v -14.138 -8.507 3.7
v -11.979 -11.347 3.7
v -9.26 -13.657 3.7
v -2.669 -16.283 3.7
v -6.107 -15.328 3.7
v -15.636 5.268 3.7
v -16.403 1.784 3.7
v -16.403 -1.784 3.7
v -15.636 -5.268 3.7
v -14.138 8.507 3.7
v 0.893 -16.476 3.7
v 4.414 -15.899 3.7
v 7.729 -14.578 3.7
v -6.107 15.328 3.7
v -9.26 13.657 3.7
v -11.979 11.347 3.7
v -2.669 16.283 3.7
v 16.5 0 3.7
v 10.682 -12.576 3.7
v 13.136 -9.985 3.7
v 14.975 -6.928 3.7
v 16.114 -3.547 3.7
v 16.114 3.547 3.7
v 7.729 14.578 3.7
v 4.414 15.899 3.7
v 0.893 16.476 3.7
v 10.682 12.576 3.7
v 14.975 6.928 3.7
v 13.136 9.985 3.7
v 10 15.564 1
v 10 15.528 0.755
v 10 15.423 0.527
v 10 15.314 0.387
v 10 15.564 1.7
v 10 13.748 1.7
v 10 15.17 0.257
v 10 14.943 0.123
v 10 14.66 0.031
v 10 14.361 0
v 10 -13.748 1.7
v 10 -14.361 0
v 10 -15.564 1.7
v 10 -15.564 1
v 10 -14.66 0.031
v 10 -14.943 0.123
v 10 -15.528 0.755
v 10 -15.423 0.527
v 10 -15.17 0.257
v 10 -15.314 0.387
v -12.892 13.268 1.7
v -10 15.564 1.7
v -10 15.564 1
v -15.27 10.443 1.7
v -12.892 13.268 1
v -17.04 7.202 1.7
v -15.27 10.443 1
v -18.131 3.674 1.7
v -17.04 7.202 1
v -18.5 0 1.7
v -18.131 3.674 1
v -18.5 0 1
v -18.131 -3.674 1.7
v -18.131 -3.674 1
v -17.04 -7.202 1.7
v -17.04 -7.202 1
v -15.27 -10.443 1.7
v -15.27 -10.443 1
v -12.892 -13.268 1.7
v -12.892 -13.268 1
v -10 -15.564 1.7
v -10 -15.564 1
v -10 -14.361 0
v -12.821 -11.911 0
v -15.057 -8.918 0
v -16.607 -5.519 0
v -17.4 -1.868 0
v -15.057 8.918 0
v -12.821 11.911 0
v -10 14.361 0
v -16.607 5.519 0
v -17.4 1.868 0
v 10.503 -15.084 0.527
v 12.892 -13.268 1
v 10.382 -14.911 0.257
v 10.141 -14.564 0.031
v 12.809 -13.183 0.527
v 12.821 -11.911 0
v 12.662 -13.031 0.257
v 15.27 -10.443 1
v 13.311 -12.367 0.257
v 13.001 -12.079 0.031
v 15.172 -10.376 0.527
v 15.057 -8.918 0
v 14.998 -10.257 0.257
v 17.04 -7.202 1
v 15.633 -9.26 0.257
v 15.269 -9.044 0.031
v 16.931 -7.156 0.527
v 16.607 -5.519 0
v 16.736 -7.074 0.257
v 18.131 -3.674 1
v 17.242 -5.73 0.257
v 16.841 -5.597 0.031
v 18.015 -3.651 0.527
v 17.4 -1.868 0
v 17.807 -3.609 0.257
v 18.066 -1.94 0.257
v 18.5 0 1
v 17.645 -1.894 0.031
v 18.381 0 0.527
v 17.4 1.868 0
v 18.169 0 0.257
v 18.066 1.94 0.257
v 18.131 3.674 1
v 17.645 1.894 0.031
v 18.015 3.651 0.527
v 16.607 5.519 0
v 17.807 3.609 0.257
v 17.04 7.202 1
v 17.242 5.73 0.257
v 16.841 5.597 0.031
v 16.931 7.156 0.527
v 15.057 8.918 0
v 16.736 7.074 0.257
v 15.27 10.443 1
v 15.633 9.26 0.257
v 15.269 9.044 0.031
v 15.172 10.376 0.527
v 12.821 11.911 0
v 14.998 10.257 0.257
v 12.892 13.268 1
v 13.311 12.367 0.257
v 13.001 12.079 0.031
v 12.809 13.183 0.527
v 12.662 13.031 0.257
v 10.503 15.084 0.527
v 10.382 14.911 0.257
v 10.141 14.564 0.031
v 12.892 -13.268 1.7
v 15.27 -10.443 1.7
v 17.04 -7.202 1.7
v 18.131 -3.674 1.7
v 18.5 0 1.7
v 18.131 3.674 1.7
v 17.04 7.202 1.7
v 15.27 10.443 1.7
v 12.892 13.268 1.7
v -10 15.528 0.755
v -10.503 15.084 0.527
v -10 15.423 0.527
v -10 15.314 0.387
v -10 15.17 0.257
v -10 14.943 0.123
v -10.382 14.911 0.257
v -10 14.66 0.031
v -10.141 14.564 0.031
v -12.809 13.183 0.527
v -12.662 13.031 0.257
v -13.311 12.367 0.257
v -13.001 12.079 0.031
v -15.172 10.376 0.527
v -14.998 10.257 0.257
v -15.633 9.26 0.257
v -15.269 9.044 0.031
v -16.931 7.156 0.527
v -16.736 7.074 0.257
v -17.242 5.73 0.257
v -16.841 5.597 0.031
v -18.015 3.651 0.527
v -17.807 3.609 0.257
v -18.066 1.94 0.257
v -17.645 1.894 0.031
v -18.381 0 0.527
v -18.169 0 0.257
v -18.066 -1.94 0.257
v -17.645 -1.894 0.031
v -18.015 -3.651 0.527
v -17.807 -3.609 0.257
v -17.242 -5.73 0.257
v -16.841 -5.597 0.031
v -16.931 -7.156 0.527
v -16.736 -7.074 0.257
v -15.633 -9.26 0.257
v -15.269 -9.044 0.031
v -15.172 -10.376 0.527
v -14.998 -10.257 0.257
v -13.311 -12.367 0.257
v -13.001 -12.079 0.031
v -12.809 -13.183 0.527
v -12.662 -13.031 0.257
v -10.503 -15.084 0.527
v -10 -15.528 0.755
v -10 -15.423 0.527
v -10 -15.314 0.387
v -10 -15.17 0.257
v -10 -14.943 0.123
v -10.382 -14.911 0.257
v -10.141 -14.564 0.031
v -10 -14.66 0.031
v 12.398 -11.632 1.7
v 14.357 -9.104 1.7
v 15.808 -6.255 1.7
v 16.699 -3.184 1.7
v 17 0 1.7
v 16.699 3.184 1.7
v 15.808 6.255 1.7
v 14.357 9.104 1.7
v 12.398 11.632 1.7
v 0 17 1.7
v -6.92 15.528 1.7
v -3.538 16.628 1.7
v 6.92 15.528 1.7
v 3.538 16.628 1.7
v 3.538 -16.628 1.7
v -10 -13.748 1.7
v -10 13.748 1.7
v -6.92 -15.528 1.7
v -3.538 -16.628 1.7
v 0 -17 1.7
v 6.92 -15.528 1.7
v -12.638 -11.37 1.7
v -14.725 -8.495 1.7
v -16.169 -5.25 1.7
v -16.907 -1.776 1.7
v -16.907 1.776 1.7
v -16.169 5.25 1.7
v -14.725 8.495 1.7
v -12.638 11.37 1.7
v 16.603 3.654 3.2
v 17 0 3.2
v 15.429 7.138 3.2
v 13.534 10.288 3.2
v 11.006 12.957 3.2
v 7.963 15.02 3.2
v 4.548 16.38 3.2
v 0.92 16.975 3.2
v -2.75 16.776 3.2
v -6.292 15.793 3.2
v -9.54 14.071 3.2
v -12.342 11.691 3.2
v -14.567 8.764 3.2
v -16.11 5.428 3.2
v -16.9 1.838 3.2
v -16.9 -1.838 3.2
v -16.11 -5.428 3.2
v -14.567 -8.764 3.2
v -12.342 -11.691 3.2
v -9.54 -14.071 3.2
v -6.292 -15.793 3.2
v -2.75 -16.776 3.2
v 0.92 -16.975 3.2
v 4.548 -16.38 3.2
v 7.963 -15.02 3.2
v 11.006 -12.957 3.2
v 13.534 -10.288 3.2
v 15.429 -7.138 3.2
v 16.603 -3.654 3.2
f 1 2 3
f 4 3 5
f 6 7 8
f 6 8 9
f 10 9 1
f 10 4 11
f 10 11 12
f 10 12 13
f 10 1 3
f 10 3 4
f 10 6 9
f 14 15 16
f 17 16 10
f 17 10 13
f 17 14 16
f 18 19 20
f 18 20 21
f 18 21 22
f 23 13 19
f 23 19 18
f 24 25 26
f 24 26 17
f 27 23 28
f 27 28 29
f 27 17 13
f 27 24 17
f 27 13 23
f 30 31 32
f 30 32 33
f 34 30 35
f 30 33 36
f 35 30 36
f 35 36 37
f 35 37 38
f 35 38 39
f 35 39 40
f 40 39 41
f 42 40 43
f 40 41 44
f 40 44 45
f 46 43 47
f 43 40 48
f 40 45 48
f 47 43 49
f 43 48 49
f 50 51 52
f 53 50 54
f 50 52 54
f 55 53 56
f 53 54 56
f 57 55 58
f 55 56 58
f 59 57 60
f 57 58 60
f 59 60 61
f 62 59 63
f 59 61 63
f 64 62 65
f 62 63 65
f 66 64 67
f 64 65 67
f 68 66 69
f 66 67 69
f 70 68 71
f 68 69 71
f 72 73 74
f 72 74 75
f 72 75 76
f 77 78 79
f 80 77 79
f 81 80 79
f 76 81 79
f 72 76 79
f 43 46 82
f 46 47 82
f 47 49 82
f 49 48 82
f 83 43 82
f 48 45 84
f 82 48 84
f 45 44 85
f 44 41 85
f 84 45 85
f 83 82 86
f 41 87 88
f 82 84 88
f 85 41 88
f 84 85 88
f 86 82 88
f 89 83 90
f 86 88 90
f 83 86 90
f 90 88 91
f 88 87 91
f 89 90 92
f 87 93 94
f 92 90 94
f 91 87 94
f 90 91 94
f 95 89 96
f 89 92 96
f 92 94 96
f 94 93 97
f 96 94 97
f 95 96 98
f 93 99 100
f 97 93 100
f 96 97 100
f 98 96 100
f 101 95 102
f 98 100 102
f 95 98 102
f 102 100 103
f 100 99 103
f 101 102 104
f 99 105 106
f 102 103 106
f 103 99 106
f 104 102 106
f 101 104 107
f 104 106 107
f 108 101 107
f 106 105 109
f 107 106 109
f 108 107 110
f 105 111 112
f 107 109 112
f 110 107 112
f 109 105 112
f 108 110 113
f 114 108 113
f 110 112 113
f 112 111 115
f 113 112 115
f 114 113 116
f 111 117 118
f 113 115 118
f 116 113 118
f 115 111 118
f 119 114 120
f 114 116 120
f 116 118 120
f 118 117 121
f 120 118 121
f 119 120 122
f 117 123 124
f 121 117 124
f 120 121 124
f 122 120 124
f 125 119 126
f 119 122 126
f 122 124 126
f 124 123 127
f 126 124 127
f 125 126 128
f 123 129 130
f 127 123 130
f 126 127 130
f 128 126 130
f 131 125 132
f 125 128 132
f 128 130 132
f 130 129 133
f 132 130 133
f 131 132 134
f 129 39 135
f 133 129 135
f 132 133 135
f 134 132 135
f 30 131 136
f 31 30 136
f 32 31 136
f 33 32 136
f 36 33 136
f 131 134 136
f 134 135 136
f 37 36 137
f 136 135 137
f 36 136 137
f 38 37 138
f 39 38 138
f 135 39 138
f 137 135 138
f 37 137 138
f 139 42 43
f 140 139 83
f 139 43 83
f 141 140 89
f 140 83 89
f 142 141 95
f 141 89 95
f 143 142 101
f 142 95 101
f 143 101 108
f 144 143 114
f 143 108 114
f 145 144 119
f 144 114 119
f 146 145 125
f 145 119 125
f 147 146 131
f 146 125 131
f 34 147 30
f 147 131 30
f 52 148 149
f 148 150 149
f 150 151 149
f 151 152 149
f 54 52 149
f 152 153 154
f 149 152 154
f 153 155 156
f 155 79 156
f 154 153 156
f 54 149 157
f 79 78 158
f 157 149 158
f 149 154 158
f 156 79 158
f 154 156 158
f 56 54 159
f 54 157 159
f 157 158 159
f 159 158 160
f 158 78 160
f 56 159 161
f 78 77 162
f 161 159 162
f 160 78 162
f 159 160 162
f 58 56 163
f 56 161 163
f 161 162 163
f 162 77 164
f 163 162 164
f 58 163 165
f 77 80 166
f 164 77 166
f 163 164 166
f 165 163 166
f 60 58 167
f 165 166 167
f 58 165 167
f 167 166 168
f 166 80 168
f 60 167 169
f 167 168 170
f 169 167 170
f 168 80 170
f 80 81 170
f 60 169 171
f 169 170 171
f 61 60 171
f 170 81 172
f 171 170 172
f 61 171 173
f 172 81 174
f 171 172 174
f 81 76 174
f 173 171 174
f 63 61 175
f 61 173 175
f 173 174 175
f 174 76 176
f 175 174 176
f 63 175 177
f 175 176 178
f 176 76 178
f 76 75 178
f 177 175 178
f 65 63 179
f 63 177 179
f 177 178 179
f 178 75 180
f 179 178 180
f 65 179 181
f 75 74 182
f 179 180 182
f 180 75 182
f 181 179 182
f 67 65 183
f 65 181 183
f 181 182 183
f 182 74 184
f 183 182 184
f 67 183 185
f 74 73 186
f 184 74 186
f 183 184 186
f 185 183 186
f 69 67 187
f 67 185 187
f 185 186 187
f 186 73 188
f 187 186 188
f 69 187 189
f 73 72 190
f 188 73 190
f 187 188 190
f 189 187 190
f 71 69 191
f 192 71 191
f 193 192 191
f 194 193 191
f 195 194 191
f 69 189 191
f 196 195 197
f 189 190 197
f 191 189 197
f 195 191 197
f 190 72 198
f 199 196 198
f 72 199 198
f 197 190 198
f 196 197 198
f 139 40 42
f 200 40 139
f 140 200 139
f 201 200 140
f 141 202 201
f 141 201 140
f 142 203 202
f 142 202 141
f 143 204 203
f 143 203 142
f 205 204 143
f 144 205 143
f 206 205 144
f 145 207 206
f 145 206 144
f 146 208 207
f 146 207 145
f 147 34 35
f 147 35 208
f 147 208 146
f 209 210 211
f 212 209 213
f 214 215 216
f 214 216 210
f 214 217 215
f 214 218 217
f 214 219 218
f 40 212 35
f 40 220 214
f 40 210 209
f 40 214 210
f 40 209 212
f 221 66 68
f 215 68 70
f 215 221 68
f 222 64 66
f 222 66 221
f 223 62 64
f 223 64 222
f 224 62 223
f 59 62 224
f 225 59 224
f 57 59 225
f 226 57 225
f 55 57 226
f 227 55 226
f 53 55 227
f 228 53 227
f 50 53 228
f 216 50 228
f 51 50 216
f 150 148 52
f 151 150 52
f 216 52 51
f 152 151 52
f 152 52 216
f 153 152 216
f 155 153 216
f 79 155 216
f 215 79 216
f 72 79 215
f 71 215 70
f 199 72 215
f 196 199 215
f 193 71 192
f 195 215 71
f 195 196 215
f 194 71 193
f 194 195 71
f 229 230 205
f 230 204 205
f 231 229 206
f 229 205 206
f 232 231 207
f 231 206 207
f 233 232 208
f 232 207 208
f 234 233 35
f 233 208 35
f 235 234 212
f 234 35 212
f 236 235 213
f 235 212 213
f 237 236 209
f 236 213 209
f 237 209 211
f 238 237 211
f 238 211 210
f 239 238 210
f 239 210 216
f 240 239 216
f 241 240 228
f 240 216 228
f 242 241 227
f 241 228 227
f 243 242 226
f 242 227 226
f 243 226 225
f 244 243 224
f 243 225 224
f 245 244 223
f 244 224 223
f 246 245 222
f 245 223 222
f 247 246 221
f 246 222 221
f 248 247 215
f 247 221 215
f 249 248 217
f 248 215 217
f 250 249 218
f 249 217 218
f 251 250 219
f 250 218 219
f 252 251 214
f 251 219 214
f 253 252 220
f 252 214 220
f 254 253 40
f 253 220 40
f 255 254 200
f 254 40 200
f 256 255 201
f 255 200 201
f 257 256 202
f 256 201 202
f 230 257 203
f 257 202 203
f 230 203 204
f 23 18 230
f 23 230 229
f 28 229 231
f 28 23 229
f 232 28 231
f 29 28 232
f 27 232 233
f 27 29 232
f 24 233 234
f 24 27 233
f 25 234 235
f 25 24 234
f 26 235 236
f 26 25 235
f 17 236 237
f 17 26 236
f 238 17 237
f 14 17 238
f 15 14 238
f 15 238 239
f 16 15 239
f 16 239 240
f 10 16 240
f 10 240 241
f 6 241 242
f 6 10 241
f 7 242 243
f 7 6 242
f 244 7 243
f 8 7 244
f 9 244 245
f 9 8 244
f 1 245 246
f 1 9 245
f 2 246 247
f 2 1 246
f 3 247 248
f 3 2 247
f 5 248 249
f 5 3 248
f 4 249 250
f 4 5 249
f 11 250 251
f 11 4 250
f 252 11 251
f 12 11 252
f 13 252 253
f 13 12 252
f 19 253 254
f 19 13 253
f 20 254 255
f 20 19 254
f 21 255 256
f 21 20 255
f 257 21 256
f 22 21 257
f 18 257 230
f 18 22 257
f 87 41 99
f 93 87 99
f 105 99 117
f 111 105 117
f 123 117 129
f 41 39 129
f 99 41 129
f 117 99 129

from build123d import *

# Parameters (mm, degrees)
F0_R     = 18.5
F1_DEPTH = 1.7
F2_R     = 17
F3_DEPTH = 2
F4_SIZE  = 0.5
F5_R     = 1
F6_W     = 20
F6_H     = 55.344078
F7_DEPTH = 1.7


with BuildPart() as f1:
    # F0 (on Top) → F1 (new body)
    with BuildSketch(Plane.XY):
        Circle(F0_R)
    extrude(amount=F1_DEPTH)

    # F2 (on face) → F3 (join)
    with BuildSketch(Plane.XY.offset(1.7)):
        Circle(F2_R)
    extrude(amount=F3_DEPTH)

    # F4
    f4_edges = [f1.edges().sort_by_distance(p)[0] for p in [
        (-17, 0, 3.7),
    ]]
    chamfer(f4_edges, length=F4_SIZE)

    # F5
    f5_edges = [f1.edges().sort_by_distance(p)[0] for p in [
        (-18.5, 0, 0),
    ]]
    fillet(f5_edges, radius=F5_R)

    # F6 (on face) → F7 (cut)
    with BuildSketch(Plane(origin=(0, 0, 0), x_dir=(1, 0, 0), z_dir=(0, 0, -1))):
        Rectangle(F6_W, F6_H)
    extrude(amount=-F7_DEPTH, mode=Mode.SUBTRACT)


solid = f1.part
